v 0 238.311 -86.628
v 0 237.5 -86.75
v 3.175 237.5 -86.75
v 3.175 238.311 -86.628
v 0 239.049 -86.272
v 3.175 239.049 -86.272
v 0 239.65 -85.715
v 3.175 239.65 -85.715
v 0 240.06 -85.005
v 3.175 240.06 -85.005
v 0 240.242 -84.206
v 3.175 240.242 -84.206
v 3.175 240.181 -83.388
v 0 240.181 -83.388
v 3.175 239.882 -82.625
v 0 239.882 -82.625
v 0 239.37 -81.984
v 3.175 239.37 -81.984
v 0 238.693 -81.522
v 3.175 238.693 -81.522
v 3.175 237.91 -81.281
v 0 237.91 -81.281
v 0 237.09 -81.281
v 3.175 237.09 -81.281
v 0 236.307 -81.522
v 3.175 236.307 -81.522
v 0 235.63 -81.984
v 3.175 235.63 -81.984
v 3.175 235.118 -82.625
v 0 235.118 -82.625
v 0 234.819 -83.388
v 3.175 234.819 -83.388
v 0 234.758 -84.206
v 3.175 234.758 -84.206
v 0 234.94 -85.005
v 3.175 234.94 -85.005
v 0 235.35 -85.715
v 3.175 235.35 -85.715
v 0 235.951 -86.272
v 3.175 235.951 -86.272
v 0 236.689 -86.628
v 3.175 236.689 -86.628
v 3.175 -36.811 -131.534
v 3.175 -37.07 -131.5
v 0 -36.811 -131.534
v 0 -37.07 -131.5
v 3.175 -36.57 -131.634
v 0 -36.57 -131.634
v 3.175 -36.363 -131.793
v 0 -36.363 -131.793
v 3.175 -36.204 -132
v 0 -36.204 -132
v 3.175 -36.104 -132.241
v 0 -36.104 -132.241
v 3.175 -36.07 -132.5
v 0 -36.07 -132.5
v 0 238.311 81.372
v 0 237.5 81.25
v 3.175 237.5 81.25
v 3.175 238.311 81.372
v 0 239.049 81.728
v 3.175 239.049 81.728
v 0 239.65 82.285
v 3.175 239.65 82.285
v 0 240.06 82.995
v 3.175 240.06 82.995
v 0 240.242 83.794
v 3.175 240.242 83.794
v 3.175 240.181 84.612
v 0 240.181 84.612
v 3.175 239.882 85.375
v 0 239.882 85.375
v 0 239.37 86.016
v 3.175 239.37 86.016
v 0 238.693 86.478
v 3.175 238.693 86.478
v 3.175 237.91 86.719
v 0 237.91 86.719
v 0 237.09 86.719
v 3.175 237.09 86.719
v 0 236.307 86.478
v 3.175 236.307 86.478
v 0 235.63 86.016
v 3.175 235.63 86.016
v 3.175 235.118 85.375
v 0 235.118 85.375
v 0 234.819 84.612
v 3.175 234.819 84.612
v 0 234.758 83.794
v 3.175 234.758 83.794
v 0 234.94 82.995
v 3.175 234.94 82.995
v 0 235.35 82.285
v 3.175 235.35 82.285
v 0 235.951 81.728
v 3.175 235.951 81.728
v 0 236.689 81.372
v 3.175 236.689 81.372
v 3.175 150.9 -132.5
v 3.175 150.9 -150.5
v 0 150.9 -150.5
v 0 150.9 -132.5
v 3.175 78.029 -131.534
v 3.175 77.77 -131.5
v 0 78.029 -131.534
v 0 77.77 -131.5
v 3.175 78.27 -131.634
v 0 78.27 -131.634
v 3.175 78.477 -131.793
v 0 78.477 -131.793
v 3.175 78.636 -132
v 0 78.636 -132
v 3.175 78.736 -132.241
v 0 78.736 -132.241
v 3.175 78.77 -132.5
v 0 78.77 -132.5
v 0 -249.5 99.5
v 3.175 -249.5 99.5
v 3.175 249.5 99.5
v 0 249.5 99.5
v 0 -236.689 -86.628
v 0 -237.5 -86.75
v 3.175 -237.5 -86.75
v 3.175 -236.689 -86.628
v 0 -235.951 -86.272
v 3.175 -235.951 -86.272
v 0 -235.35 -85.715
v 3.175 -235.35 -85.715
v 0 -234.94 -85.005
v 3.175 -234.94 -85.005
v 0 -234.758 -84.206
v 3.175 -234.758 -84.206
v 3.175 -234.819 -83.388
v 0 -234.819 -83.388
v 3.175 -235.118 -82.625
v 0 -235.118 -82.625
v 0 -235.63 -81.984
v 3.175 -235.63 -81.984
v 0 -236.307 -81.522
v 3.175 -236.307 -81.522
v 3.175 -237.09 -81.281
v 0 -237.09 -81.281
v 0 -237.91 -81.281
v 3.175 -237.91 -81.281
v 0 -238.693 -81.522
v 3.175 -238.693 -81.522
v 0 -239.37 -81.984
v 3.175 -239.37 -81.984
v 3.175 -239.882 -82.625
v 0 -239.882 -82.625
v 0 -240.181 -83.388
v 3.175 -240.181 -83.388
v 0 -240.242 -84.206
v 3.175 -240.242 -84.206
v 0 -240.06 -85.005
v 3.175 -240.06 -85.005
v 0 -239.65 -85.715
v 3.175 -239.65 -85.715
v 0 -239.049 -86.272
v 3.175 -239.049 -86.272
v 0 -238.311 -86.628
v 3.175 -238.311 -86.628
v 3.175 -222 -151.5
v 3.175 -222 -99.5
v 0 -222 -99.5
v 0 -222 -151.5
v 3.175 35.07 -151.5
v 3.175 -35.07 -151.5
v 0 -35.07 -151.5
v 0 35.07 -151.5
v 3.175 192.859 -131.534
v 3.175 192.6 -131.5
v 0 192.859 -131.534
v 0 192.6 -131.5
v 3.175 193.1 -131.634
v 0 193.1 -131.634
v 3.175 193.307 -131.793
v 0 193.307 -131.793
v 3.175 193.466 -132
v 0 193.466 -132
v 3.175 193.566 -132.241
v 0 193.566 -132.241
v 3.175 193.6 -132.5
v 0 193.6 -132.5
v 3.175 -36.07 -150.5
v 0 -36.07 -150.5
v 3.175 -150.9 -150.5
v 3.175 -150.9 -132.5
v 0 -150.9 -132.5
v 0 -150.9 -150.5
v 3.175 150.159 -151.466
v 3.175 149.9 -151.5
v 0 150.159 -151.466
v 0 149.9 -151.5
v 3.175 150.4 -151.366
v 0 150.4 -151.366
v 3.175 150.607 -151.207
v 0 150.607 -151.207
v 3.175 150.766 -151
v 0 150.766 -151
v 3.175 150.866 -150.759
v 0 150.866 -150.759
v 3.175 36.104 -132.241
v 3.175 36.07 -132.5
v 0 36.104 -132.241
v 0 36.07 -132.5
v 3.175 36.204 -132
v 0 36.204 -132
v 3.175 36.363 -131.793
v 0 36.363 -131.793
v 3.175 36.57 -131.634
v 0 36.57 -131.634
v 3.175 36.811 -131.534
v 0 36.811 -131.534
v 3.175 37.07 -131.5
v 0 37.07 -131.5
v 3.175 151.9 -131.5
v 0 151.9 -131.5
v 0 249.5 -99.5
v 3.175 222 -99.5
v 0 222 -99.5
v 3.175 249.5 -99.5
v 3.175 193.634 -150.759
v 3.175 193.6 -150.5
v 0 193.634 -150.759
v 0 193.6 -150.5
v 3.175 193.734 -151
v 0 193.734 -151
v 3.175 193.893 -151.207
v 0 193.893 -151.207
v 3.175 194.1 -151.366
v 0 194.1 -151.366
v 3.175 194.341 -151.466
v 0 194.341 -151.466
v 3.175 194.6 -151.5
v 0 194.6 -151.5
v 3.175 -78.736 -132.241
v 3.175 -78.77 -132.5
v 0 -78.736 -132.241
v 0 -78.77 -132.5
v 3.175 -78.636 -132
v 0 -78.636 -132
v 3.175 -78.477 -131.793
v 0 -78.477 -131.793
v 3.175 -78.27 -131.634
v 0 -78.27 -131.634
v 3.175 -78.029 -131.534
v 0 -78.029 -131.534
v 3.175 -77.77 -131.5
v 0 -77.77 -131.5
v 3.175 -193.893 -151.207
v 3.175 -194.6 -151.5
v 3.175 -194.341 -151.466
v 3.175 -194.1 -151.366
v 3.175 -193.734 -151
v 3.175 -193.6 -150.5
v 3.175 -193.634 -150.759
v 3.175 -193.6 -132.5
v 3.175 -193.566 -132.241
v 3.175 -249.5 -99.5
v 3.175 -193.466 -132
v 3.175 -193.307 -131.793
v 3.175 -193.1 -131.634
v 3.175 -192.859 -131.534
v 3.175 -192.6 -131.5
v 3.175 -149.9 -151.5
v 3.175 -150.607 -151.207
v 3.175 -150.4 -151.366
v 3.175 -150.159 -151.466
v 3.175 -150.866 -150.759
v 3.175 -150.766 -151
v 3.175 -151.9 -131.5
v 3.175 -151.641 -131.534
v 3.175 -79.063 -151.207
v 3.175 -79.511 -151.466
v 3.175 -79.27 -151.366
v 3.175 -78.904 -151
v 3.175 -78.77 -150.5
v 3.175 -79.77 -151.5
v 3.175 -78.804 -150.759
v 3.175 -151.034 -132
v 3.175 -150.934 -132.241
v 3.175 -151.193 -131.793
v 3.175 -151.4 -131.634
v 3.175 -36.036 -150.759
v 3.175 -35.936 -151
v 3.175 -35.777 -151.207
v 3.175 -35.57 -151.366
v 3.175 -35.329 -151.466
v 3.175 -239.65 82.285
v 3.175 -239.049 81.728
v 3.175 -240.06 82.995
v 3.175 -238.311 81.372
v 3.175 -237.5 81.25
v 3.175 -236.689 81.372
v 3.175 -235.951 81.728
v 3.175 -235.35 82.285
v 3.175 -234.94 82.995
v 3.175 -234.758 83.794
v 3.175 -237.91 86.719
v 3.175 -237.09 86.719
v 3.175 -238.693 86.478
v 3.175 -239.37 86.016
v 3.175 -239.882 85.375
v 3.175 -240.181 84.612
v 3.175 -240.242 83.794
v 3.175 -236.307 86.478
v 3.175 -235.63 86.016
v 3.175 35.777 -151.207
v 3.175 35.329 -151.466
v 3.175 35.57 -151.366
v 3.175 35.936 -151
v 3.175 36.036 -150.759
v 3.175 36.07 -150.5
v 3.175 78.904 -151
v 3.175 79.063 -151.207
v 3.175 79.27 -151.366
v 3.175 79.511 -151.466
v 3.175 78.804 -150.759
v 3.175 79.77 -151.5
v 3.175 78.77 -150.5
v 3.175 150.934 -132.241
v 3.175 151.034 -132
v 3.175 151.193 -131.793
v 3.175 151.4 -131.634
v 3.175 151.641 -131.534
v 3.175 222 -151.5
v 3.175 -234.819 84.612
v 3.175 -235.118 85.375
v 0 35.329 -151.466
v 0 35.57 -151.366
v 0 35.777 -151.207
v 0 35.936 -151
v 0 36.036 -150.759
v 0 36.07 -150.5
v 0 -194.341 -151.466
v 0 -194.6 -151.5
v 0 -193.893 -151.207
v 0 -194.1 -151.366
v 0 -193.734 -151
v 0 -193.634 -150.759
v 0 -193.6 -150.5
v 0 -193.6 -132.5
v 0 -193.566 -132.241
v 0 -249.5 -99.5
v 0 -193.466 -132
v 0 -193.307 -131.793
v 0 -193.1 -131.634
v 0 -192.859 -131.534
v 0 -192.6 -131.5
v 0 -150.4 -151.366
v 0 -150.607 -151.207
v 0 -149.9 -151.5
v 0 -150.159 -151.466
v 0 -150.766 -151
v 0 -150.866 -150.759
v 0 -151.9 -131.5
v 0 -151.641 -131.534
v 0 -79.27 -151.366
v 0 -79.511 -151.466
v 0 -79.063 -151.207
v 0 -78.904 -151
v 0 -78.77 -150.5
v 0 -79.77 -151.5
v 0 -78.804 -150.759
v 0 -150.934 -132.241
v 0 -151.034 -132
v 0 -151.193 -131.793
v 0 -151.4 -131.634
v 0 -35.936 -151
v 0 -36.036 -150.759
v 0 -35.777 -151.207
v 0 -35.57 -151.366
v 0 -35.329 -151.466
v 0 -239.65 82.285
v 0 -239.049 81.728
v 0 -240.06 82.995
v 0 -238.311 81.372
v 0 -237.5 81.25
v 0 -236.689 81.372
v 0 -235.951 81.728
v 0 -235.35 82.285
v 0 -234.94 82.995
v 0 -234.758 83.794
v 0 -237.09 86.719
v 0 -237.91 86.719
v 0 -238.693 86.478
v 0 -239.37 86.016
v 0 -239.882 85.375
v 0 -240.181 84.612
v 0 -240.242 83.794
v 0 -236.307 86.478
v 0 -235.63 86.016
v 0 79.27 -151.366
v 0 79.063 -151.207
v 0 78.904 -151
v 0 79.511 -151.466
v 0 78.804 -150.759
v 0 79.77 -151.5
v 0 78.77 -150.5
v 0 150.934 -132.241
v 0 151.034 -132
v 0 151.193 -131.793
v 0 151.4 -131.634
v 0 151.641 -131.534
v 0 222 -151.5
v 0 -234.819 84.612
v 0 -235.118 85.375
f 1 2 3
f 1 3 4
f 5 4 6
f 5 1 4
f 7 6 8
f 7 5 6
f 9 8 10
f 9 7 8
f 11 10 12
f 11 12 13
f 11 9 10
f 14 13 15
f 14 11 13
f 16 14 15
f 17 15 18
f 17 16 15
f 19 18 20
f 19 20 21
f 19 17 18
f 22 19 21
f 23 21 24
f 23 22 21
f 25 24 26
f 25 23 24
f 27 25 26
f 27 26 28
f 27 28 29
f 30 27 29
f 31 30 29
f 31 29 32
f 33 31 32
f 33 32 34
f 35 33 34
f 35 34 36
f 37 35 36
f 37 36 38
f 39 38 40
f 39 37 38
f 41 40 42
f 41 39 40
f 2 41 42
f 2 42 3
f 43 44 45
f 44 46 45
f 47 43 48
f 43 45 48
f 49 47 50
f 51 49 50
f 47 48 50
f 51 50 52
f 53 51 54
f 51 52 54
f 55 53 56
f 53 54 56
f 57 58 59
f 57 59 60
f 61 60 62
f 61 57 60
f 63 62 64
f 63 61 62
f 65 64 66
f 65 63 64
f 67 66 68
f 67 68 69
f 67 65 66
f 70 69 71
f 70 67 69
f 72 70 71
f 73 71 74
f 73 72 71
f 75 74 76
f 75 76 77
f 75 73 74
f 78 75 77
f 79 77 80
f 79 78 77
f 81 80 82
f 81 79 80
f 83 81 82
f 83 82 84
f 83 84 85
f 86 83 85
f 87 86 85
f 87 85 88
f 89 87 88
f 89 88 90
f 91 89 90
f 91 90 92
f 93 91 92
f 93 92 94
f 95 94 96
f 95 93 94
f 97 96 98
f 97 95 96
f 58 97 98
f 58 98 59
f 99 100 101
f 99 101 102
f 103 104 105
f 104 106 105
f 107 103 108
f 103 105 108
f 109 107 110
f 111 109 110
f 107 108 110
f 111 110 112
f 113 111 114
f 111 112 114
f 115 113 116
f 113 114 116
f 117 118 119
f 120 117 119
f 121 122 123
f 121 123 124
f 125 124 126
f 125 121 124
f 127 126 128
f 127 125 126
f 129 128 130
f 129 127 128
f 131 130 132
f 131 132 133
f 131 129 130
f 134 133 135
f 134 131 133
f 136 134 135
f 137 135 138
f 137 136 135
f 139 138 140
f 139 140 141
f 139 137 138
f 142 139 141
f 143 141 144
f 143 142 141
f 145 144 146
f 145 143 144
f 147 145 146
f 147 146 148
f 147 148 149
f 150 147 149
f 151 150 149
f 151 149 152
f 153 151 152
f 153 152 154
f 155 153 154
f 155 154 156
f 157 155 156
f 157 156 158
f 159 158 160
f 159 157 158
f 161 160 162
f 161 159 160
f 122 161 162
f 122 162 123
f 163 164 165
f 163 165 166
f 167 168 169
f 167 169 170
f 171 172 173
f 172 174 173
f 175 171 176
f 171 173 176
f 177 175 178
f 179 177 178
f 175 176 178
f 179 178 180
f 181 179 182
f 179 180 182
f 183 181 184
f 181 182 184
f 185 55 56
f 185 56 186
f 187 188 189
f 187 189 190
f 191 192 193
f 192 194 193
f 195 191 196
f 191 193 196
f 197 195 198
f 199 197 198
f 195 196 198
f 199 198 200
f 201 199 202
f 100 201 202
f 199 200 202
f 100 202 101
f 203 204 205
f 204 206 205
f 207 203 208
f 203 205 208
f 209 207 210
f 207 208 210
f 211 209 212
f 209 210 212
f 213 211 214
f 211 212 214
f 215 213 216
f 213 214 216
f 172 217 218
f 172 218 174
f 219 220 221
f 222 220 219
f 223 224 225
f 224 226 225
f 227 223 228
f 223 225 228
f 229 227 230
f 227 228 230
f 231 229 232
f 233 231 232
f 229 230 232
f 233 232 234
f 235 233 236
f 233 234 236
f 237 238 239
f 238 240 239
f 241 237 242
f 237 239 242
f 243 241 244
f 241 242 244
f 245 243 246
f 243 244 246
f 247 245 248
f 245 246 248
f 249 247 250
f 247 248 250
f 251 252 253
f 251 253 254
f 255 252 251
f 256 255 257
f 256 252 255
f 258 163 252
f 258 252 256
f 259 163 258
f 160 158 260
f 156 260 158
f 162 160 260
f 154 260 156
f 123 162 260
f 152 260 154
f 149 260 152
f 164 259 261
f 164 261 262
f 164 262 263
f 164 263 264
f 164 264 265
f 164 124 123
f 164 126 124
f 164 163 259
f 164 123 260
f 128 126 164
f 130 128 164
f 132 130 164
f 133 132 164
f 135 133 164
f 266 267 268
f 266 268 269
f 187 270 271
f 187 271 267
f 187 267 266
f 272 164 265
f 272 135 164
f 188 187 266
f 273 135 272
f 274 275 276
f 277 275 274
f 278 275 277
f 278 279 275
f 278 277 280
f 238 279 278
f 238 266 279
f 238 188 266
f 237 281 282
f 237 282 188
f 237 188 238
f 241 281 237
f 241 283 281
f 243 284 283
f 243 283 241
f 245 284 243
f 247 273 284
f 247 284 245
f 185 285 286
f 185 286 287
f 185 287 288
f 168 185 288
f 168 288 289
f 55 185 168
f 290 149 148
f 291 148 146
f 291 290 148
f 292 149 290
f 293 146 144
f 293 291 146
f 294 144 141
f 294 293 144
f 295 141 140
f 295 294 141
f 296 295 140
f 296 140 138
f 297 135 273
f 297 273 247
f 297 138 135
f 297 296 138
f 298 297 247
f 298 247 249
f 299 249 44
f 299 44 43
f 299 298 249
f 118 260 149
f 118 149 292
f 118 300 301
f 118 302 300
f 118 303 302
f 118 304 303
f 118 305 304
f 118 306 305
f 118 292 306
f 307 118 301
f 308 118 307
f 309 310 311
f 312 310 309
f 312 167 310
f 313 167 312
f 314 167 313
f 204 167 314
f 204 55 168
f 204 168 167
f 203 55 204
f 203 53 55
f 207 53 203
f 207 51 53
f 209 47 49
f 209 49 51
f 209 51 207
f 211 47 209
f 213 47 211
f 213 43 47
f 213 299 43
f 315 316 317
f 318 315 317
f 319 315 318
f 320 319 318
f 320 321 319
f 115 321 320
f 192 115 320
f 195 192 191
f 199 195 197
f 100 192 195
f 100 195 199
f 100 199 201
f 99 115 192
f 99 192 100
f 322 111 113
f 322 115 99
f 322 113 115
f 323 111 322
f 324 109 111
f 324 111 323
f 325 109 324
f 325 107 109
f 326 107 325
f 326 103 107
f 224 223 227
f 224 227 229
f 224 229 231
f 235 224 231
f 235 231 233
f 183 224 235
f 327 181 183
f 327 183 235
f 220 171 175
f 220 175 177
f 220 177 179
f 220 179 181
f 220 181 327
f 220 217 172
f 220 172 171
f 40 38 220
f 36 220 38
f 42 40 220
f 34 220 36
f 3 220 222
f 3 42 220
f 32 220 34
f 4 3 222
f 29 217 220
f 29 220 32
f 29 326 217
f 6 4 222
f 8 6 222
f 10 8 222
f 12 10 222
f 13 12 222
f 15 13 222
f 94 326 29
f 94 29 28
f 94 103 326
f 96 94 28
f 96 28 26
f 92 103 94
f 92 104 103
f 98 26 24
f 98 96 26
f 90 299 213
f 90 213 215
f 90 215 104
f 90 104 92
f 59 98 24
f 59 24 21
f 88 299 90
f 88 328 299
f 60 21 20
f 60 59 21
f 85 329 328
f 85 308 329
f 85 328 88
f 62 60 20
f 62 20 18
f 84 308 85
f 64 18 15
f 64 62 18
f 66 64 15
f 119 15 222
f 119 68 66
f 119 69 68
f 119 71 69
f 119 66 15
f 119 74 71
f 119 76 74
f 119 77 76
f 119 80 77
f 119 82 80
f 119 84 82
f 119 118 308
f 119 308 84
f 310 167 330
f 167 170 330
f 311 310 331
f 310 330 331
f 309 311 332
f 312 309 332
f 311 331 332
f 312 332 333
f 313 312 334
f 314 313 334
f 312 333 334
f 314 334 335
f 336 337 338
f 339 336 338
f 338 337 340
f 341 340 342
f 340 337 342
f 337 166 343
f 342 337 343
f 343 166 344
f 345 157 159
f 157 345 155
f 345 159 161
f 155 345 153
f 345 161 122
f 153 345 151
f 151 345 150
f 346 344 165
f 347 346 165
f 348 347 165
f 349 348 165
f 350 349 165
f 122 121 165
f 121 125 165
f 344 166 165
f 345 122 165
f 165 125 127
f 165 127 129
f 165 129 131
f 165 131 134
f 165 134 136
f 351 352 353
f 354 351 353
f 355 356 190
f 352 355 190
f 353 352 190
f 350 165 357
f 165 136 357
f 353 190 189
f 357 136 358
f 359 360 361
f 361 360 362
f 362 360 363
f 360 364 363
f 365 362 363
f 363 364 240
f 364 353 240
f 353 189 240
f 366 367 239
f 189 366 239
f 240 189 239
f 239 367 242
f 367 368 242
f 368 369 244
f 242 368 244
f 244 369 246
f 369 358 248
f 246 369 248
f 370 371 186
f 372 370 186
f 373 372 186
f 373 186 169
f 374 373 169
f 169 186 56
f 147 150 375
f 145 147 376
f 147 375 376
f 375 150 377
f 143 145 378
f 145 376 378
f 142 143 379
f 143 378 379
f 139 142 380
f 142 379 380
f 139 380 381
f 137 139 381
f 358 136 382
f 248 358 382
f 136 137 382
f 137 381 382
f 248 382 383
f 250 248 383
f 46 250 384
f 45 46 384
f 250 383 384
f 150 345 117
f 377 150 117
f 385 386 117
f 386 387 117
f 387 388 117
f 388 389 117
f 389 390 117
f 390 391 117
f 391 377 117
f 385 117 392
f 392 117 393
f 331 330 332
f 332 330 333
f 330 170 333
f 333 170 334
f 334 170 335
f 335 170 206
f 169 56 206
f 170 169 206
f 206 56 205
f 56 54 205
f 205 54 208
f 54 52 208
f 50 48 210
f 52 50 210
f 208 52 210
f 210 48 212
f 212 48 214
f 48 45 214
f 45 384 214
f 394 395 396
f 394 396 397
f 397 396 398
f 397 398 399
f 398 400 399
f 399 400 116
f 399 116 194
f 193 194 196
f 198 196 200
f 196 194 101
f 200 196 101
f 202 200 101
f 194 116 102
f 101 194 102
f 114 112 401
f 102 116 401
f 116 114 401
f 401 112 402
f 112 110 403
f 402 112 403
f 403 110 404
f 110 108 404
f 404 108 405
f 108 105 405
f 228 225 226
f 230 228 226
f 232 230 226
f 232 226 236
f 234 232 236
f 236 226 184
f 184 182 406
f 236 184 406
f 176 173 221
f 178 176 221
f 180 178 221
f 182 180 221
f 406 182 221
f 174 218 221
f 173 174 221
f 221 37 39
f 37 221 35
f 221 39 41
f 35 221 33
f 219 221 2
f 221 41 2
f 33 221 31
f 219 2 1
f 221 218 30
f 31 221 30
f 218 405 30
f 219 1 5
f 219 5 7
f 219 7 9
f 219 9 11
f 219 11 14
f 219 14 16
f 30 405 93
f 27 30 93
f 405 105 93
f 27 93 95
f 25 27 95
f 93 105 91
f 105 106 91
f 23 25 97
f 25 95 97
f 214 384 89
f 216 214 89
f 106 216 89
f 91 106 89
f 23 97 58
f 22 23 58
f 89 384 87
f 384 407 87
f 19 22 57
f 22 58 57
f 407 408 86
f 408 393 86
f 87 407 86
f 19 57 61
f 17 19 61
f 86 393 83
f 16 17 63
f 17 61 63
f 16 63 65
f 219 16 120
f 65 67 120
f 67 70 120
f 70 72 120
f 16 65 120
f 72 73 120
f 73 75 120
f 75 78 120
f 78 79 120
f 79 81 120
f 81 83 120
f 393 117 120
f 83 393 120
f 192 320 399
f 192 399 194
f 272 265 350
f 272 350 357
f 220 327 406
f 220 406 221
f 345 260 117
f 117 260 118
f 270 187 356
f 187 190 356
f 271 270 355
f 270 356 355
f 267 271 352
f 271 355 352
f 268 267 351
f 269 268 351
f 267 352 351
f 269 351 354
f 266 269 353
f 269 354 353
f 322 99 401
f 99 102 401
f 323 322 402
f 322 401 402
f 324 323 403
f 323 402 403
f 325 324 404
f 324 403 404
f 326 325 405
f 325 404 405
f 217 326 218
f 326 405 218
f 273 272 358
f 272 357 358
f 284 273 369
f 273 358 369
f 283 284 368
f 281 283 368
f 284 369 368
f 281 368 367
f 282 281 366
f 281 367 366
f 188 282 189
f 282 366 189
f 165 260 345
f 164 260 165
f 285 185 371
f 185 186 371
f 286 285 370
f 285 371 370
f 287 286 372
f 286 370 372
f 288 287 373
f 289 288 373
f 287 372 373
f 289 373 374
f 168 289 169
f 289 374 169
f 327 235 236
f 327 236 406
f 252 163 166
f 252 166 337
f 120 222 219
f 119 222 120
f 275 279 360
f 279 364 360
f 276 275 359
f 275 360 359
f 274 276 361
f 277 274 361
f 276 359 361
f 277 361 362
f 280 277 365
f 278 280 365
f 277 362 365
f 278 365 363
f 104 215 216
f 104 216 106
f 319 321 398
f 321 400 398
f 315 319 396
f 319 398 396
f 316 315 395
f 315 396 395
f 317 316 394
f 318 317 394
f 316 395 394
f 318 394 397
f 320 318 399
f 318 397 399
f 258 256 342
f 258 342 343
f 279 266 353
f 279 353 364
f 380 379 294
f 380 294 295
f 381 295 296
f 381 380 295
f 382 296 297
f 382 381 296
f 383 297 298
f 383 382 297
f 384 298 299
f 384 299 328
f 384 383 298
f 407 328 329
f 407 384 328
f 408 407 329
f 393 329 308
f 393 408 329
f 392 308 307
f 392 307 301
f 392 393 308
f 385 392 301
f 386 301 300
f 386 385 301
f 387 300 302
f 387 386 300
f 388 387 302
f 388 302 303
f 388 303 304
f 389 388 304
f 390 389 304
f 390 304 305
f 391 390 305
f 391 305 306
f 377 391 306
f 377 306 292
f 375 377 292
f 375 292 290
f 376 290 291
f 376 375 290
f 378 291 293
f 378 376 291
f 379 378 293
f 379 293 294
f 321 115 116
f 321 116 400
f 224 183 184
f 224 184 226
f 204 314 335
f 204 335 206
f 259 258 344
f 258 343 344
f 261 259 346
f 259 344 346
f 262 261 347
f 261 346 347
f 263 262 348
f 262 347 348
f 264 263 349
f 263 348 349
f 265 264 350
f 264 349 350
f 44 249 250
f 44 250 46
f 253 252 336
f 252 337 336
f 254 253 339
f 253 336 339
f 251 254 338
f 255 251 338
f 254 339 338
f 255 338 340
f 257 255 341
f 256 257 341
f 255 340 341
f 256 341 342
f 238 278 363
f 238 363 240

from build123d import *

# Parameters (mm, degrees)
SKETCH1_W           = 500
SKETCH1_H           = 200
SKETCH1_R           = 2.75
BOSS_EXTRUDE1_DEPTH = 3.175
SKETCH2_W           = 500
SKETCH2_H           = 200
SKETCH2_W_2         = 499
SKETCH2_H_2         = 199
CUT_EXTRUDE1_DEPTH  = 3.175
BOSS_EXTRUDE2_DEPTH = 3.175
FILLET1_R           = 1


with BuildPart() as part:
    # Sketch1 → Boss-Extrude1 (new body)
    with BuildSketch(Plane.YZ):
        Rectangle(SKETCH1_W, SKETCH1_H)
        with Locations(Location((237.5, 84, 0), (0, 0, 270))):
            Circle(SKETCH1_R, mode=Mode.SUBTRACT)
        with Locations(Location((-237.5, 84, 0), (0, 0, 270))):
            Circle(SKETCH1_R, mode=Mode.SUBTRACT)
        with Locations(Location((237.5, -84, 0), (0, 0, 270))):
            Circle(SKETCH1_R, mode=Mode.SUBTRACT)
        with Locations(Location((-237.5, -84, 0), (0, 0, 270))):
            Circle(SKETCH1_R, mode=Mode.SUBTRACT)
    extrude(amount=BOSS_EXTRUDE1_DEPTH)

    # Sketch2 → Cut-Extrude1 (cut)
    with BuildSketch(Plane.YZ.offset(3.175)):
        Rectangle(SKETCH2_W, SKETCH2_H)
        Rectangle(SKETCH2_W_2, SKETCH2_H_2, mode=Mode.SUBTRACT)
    extrude(amount=-CUT_EXTRUDE1_DEPTH, mode=Mode.SUBTRACT)

    # Sketch3 → Boss-Extrude2 (add, through all)
    with BuildSketch(Plane.YZ.offset(3.175)):
        Polygon((222, -99.5), (-222, -99.5), (-222, -151.5), (-193.6, -151.5), (-193.6, -131.5), (-150.9, -131.5), (-150.9, -151.5), (-78.77, -151.5), (-78.77, -131.5), (-36.07, -131.5), (-36.07, -151.5), (36.07, -151.5), (36.07, -131.5), (78.77, -131.5), (78.77, -151.5), (150.9, -151.5), (150.9, -131.5), (193.6, -131.5), (193.6, -151.5), (222, -151.5), align=None)
    extrude(amount=-BOSS_EXTRUDE2_DEPTH)

    # Fillet1
    fillet1_edges = [part.edges().sort_by_distance(p)[0] for p in [
        (1.5875, 193.6, -151.5),
        (1.5875, 193.6, -131.5),
        (1.5875, 150.9, -131.5),
        (1.5875, 150.9, -151.5),
        (1.5875, 78.77, -151.5),
        (1.5875, 78.77, -131.5),
        (1.5875, 36.07, -131.5),
        (1.5875, 36.07, -151.5),
        (1.5875, -36.07, -151.5),
        (1.5875, -36.07, -131.5),
        (1.5875, -78.77, -131.5),
        (1.5875, -78.77, -151.5),
        (1.5875, -150.9, -151.5),
        (1.5875, -150.9, -131.5),
        (1.5875, -193.6, -131.5),
        (1.5875, -193.6, -151.5),
    ]]
    fillet(fillet1_edges, radius=FILLET1_R)


solid = part.part
